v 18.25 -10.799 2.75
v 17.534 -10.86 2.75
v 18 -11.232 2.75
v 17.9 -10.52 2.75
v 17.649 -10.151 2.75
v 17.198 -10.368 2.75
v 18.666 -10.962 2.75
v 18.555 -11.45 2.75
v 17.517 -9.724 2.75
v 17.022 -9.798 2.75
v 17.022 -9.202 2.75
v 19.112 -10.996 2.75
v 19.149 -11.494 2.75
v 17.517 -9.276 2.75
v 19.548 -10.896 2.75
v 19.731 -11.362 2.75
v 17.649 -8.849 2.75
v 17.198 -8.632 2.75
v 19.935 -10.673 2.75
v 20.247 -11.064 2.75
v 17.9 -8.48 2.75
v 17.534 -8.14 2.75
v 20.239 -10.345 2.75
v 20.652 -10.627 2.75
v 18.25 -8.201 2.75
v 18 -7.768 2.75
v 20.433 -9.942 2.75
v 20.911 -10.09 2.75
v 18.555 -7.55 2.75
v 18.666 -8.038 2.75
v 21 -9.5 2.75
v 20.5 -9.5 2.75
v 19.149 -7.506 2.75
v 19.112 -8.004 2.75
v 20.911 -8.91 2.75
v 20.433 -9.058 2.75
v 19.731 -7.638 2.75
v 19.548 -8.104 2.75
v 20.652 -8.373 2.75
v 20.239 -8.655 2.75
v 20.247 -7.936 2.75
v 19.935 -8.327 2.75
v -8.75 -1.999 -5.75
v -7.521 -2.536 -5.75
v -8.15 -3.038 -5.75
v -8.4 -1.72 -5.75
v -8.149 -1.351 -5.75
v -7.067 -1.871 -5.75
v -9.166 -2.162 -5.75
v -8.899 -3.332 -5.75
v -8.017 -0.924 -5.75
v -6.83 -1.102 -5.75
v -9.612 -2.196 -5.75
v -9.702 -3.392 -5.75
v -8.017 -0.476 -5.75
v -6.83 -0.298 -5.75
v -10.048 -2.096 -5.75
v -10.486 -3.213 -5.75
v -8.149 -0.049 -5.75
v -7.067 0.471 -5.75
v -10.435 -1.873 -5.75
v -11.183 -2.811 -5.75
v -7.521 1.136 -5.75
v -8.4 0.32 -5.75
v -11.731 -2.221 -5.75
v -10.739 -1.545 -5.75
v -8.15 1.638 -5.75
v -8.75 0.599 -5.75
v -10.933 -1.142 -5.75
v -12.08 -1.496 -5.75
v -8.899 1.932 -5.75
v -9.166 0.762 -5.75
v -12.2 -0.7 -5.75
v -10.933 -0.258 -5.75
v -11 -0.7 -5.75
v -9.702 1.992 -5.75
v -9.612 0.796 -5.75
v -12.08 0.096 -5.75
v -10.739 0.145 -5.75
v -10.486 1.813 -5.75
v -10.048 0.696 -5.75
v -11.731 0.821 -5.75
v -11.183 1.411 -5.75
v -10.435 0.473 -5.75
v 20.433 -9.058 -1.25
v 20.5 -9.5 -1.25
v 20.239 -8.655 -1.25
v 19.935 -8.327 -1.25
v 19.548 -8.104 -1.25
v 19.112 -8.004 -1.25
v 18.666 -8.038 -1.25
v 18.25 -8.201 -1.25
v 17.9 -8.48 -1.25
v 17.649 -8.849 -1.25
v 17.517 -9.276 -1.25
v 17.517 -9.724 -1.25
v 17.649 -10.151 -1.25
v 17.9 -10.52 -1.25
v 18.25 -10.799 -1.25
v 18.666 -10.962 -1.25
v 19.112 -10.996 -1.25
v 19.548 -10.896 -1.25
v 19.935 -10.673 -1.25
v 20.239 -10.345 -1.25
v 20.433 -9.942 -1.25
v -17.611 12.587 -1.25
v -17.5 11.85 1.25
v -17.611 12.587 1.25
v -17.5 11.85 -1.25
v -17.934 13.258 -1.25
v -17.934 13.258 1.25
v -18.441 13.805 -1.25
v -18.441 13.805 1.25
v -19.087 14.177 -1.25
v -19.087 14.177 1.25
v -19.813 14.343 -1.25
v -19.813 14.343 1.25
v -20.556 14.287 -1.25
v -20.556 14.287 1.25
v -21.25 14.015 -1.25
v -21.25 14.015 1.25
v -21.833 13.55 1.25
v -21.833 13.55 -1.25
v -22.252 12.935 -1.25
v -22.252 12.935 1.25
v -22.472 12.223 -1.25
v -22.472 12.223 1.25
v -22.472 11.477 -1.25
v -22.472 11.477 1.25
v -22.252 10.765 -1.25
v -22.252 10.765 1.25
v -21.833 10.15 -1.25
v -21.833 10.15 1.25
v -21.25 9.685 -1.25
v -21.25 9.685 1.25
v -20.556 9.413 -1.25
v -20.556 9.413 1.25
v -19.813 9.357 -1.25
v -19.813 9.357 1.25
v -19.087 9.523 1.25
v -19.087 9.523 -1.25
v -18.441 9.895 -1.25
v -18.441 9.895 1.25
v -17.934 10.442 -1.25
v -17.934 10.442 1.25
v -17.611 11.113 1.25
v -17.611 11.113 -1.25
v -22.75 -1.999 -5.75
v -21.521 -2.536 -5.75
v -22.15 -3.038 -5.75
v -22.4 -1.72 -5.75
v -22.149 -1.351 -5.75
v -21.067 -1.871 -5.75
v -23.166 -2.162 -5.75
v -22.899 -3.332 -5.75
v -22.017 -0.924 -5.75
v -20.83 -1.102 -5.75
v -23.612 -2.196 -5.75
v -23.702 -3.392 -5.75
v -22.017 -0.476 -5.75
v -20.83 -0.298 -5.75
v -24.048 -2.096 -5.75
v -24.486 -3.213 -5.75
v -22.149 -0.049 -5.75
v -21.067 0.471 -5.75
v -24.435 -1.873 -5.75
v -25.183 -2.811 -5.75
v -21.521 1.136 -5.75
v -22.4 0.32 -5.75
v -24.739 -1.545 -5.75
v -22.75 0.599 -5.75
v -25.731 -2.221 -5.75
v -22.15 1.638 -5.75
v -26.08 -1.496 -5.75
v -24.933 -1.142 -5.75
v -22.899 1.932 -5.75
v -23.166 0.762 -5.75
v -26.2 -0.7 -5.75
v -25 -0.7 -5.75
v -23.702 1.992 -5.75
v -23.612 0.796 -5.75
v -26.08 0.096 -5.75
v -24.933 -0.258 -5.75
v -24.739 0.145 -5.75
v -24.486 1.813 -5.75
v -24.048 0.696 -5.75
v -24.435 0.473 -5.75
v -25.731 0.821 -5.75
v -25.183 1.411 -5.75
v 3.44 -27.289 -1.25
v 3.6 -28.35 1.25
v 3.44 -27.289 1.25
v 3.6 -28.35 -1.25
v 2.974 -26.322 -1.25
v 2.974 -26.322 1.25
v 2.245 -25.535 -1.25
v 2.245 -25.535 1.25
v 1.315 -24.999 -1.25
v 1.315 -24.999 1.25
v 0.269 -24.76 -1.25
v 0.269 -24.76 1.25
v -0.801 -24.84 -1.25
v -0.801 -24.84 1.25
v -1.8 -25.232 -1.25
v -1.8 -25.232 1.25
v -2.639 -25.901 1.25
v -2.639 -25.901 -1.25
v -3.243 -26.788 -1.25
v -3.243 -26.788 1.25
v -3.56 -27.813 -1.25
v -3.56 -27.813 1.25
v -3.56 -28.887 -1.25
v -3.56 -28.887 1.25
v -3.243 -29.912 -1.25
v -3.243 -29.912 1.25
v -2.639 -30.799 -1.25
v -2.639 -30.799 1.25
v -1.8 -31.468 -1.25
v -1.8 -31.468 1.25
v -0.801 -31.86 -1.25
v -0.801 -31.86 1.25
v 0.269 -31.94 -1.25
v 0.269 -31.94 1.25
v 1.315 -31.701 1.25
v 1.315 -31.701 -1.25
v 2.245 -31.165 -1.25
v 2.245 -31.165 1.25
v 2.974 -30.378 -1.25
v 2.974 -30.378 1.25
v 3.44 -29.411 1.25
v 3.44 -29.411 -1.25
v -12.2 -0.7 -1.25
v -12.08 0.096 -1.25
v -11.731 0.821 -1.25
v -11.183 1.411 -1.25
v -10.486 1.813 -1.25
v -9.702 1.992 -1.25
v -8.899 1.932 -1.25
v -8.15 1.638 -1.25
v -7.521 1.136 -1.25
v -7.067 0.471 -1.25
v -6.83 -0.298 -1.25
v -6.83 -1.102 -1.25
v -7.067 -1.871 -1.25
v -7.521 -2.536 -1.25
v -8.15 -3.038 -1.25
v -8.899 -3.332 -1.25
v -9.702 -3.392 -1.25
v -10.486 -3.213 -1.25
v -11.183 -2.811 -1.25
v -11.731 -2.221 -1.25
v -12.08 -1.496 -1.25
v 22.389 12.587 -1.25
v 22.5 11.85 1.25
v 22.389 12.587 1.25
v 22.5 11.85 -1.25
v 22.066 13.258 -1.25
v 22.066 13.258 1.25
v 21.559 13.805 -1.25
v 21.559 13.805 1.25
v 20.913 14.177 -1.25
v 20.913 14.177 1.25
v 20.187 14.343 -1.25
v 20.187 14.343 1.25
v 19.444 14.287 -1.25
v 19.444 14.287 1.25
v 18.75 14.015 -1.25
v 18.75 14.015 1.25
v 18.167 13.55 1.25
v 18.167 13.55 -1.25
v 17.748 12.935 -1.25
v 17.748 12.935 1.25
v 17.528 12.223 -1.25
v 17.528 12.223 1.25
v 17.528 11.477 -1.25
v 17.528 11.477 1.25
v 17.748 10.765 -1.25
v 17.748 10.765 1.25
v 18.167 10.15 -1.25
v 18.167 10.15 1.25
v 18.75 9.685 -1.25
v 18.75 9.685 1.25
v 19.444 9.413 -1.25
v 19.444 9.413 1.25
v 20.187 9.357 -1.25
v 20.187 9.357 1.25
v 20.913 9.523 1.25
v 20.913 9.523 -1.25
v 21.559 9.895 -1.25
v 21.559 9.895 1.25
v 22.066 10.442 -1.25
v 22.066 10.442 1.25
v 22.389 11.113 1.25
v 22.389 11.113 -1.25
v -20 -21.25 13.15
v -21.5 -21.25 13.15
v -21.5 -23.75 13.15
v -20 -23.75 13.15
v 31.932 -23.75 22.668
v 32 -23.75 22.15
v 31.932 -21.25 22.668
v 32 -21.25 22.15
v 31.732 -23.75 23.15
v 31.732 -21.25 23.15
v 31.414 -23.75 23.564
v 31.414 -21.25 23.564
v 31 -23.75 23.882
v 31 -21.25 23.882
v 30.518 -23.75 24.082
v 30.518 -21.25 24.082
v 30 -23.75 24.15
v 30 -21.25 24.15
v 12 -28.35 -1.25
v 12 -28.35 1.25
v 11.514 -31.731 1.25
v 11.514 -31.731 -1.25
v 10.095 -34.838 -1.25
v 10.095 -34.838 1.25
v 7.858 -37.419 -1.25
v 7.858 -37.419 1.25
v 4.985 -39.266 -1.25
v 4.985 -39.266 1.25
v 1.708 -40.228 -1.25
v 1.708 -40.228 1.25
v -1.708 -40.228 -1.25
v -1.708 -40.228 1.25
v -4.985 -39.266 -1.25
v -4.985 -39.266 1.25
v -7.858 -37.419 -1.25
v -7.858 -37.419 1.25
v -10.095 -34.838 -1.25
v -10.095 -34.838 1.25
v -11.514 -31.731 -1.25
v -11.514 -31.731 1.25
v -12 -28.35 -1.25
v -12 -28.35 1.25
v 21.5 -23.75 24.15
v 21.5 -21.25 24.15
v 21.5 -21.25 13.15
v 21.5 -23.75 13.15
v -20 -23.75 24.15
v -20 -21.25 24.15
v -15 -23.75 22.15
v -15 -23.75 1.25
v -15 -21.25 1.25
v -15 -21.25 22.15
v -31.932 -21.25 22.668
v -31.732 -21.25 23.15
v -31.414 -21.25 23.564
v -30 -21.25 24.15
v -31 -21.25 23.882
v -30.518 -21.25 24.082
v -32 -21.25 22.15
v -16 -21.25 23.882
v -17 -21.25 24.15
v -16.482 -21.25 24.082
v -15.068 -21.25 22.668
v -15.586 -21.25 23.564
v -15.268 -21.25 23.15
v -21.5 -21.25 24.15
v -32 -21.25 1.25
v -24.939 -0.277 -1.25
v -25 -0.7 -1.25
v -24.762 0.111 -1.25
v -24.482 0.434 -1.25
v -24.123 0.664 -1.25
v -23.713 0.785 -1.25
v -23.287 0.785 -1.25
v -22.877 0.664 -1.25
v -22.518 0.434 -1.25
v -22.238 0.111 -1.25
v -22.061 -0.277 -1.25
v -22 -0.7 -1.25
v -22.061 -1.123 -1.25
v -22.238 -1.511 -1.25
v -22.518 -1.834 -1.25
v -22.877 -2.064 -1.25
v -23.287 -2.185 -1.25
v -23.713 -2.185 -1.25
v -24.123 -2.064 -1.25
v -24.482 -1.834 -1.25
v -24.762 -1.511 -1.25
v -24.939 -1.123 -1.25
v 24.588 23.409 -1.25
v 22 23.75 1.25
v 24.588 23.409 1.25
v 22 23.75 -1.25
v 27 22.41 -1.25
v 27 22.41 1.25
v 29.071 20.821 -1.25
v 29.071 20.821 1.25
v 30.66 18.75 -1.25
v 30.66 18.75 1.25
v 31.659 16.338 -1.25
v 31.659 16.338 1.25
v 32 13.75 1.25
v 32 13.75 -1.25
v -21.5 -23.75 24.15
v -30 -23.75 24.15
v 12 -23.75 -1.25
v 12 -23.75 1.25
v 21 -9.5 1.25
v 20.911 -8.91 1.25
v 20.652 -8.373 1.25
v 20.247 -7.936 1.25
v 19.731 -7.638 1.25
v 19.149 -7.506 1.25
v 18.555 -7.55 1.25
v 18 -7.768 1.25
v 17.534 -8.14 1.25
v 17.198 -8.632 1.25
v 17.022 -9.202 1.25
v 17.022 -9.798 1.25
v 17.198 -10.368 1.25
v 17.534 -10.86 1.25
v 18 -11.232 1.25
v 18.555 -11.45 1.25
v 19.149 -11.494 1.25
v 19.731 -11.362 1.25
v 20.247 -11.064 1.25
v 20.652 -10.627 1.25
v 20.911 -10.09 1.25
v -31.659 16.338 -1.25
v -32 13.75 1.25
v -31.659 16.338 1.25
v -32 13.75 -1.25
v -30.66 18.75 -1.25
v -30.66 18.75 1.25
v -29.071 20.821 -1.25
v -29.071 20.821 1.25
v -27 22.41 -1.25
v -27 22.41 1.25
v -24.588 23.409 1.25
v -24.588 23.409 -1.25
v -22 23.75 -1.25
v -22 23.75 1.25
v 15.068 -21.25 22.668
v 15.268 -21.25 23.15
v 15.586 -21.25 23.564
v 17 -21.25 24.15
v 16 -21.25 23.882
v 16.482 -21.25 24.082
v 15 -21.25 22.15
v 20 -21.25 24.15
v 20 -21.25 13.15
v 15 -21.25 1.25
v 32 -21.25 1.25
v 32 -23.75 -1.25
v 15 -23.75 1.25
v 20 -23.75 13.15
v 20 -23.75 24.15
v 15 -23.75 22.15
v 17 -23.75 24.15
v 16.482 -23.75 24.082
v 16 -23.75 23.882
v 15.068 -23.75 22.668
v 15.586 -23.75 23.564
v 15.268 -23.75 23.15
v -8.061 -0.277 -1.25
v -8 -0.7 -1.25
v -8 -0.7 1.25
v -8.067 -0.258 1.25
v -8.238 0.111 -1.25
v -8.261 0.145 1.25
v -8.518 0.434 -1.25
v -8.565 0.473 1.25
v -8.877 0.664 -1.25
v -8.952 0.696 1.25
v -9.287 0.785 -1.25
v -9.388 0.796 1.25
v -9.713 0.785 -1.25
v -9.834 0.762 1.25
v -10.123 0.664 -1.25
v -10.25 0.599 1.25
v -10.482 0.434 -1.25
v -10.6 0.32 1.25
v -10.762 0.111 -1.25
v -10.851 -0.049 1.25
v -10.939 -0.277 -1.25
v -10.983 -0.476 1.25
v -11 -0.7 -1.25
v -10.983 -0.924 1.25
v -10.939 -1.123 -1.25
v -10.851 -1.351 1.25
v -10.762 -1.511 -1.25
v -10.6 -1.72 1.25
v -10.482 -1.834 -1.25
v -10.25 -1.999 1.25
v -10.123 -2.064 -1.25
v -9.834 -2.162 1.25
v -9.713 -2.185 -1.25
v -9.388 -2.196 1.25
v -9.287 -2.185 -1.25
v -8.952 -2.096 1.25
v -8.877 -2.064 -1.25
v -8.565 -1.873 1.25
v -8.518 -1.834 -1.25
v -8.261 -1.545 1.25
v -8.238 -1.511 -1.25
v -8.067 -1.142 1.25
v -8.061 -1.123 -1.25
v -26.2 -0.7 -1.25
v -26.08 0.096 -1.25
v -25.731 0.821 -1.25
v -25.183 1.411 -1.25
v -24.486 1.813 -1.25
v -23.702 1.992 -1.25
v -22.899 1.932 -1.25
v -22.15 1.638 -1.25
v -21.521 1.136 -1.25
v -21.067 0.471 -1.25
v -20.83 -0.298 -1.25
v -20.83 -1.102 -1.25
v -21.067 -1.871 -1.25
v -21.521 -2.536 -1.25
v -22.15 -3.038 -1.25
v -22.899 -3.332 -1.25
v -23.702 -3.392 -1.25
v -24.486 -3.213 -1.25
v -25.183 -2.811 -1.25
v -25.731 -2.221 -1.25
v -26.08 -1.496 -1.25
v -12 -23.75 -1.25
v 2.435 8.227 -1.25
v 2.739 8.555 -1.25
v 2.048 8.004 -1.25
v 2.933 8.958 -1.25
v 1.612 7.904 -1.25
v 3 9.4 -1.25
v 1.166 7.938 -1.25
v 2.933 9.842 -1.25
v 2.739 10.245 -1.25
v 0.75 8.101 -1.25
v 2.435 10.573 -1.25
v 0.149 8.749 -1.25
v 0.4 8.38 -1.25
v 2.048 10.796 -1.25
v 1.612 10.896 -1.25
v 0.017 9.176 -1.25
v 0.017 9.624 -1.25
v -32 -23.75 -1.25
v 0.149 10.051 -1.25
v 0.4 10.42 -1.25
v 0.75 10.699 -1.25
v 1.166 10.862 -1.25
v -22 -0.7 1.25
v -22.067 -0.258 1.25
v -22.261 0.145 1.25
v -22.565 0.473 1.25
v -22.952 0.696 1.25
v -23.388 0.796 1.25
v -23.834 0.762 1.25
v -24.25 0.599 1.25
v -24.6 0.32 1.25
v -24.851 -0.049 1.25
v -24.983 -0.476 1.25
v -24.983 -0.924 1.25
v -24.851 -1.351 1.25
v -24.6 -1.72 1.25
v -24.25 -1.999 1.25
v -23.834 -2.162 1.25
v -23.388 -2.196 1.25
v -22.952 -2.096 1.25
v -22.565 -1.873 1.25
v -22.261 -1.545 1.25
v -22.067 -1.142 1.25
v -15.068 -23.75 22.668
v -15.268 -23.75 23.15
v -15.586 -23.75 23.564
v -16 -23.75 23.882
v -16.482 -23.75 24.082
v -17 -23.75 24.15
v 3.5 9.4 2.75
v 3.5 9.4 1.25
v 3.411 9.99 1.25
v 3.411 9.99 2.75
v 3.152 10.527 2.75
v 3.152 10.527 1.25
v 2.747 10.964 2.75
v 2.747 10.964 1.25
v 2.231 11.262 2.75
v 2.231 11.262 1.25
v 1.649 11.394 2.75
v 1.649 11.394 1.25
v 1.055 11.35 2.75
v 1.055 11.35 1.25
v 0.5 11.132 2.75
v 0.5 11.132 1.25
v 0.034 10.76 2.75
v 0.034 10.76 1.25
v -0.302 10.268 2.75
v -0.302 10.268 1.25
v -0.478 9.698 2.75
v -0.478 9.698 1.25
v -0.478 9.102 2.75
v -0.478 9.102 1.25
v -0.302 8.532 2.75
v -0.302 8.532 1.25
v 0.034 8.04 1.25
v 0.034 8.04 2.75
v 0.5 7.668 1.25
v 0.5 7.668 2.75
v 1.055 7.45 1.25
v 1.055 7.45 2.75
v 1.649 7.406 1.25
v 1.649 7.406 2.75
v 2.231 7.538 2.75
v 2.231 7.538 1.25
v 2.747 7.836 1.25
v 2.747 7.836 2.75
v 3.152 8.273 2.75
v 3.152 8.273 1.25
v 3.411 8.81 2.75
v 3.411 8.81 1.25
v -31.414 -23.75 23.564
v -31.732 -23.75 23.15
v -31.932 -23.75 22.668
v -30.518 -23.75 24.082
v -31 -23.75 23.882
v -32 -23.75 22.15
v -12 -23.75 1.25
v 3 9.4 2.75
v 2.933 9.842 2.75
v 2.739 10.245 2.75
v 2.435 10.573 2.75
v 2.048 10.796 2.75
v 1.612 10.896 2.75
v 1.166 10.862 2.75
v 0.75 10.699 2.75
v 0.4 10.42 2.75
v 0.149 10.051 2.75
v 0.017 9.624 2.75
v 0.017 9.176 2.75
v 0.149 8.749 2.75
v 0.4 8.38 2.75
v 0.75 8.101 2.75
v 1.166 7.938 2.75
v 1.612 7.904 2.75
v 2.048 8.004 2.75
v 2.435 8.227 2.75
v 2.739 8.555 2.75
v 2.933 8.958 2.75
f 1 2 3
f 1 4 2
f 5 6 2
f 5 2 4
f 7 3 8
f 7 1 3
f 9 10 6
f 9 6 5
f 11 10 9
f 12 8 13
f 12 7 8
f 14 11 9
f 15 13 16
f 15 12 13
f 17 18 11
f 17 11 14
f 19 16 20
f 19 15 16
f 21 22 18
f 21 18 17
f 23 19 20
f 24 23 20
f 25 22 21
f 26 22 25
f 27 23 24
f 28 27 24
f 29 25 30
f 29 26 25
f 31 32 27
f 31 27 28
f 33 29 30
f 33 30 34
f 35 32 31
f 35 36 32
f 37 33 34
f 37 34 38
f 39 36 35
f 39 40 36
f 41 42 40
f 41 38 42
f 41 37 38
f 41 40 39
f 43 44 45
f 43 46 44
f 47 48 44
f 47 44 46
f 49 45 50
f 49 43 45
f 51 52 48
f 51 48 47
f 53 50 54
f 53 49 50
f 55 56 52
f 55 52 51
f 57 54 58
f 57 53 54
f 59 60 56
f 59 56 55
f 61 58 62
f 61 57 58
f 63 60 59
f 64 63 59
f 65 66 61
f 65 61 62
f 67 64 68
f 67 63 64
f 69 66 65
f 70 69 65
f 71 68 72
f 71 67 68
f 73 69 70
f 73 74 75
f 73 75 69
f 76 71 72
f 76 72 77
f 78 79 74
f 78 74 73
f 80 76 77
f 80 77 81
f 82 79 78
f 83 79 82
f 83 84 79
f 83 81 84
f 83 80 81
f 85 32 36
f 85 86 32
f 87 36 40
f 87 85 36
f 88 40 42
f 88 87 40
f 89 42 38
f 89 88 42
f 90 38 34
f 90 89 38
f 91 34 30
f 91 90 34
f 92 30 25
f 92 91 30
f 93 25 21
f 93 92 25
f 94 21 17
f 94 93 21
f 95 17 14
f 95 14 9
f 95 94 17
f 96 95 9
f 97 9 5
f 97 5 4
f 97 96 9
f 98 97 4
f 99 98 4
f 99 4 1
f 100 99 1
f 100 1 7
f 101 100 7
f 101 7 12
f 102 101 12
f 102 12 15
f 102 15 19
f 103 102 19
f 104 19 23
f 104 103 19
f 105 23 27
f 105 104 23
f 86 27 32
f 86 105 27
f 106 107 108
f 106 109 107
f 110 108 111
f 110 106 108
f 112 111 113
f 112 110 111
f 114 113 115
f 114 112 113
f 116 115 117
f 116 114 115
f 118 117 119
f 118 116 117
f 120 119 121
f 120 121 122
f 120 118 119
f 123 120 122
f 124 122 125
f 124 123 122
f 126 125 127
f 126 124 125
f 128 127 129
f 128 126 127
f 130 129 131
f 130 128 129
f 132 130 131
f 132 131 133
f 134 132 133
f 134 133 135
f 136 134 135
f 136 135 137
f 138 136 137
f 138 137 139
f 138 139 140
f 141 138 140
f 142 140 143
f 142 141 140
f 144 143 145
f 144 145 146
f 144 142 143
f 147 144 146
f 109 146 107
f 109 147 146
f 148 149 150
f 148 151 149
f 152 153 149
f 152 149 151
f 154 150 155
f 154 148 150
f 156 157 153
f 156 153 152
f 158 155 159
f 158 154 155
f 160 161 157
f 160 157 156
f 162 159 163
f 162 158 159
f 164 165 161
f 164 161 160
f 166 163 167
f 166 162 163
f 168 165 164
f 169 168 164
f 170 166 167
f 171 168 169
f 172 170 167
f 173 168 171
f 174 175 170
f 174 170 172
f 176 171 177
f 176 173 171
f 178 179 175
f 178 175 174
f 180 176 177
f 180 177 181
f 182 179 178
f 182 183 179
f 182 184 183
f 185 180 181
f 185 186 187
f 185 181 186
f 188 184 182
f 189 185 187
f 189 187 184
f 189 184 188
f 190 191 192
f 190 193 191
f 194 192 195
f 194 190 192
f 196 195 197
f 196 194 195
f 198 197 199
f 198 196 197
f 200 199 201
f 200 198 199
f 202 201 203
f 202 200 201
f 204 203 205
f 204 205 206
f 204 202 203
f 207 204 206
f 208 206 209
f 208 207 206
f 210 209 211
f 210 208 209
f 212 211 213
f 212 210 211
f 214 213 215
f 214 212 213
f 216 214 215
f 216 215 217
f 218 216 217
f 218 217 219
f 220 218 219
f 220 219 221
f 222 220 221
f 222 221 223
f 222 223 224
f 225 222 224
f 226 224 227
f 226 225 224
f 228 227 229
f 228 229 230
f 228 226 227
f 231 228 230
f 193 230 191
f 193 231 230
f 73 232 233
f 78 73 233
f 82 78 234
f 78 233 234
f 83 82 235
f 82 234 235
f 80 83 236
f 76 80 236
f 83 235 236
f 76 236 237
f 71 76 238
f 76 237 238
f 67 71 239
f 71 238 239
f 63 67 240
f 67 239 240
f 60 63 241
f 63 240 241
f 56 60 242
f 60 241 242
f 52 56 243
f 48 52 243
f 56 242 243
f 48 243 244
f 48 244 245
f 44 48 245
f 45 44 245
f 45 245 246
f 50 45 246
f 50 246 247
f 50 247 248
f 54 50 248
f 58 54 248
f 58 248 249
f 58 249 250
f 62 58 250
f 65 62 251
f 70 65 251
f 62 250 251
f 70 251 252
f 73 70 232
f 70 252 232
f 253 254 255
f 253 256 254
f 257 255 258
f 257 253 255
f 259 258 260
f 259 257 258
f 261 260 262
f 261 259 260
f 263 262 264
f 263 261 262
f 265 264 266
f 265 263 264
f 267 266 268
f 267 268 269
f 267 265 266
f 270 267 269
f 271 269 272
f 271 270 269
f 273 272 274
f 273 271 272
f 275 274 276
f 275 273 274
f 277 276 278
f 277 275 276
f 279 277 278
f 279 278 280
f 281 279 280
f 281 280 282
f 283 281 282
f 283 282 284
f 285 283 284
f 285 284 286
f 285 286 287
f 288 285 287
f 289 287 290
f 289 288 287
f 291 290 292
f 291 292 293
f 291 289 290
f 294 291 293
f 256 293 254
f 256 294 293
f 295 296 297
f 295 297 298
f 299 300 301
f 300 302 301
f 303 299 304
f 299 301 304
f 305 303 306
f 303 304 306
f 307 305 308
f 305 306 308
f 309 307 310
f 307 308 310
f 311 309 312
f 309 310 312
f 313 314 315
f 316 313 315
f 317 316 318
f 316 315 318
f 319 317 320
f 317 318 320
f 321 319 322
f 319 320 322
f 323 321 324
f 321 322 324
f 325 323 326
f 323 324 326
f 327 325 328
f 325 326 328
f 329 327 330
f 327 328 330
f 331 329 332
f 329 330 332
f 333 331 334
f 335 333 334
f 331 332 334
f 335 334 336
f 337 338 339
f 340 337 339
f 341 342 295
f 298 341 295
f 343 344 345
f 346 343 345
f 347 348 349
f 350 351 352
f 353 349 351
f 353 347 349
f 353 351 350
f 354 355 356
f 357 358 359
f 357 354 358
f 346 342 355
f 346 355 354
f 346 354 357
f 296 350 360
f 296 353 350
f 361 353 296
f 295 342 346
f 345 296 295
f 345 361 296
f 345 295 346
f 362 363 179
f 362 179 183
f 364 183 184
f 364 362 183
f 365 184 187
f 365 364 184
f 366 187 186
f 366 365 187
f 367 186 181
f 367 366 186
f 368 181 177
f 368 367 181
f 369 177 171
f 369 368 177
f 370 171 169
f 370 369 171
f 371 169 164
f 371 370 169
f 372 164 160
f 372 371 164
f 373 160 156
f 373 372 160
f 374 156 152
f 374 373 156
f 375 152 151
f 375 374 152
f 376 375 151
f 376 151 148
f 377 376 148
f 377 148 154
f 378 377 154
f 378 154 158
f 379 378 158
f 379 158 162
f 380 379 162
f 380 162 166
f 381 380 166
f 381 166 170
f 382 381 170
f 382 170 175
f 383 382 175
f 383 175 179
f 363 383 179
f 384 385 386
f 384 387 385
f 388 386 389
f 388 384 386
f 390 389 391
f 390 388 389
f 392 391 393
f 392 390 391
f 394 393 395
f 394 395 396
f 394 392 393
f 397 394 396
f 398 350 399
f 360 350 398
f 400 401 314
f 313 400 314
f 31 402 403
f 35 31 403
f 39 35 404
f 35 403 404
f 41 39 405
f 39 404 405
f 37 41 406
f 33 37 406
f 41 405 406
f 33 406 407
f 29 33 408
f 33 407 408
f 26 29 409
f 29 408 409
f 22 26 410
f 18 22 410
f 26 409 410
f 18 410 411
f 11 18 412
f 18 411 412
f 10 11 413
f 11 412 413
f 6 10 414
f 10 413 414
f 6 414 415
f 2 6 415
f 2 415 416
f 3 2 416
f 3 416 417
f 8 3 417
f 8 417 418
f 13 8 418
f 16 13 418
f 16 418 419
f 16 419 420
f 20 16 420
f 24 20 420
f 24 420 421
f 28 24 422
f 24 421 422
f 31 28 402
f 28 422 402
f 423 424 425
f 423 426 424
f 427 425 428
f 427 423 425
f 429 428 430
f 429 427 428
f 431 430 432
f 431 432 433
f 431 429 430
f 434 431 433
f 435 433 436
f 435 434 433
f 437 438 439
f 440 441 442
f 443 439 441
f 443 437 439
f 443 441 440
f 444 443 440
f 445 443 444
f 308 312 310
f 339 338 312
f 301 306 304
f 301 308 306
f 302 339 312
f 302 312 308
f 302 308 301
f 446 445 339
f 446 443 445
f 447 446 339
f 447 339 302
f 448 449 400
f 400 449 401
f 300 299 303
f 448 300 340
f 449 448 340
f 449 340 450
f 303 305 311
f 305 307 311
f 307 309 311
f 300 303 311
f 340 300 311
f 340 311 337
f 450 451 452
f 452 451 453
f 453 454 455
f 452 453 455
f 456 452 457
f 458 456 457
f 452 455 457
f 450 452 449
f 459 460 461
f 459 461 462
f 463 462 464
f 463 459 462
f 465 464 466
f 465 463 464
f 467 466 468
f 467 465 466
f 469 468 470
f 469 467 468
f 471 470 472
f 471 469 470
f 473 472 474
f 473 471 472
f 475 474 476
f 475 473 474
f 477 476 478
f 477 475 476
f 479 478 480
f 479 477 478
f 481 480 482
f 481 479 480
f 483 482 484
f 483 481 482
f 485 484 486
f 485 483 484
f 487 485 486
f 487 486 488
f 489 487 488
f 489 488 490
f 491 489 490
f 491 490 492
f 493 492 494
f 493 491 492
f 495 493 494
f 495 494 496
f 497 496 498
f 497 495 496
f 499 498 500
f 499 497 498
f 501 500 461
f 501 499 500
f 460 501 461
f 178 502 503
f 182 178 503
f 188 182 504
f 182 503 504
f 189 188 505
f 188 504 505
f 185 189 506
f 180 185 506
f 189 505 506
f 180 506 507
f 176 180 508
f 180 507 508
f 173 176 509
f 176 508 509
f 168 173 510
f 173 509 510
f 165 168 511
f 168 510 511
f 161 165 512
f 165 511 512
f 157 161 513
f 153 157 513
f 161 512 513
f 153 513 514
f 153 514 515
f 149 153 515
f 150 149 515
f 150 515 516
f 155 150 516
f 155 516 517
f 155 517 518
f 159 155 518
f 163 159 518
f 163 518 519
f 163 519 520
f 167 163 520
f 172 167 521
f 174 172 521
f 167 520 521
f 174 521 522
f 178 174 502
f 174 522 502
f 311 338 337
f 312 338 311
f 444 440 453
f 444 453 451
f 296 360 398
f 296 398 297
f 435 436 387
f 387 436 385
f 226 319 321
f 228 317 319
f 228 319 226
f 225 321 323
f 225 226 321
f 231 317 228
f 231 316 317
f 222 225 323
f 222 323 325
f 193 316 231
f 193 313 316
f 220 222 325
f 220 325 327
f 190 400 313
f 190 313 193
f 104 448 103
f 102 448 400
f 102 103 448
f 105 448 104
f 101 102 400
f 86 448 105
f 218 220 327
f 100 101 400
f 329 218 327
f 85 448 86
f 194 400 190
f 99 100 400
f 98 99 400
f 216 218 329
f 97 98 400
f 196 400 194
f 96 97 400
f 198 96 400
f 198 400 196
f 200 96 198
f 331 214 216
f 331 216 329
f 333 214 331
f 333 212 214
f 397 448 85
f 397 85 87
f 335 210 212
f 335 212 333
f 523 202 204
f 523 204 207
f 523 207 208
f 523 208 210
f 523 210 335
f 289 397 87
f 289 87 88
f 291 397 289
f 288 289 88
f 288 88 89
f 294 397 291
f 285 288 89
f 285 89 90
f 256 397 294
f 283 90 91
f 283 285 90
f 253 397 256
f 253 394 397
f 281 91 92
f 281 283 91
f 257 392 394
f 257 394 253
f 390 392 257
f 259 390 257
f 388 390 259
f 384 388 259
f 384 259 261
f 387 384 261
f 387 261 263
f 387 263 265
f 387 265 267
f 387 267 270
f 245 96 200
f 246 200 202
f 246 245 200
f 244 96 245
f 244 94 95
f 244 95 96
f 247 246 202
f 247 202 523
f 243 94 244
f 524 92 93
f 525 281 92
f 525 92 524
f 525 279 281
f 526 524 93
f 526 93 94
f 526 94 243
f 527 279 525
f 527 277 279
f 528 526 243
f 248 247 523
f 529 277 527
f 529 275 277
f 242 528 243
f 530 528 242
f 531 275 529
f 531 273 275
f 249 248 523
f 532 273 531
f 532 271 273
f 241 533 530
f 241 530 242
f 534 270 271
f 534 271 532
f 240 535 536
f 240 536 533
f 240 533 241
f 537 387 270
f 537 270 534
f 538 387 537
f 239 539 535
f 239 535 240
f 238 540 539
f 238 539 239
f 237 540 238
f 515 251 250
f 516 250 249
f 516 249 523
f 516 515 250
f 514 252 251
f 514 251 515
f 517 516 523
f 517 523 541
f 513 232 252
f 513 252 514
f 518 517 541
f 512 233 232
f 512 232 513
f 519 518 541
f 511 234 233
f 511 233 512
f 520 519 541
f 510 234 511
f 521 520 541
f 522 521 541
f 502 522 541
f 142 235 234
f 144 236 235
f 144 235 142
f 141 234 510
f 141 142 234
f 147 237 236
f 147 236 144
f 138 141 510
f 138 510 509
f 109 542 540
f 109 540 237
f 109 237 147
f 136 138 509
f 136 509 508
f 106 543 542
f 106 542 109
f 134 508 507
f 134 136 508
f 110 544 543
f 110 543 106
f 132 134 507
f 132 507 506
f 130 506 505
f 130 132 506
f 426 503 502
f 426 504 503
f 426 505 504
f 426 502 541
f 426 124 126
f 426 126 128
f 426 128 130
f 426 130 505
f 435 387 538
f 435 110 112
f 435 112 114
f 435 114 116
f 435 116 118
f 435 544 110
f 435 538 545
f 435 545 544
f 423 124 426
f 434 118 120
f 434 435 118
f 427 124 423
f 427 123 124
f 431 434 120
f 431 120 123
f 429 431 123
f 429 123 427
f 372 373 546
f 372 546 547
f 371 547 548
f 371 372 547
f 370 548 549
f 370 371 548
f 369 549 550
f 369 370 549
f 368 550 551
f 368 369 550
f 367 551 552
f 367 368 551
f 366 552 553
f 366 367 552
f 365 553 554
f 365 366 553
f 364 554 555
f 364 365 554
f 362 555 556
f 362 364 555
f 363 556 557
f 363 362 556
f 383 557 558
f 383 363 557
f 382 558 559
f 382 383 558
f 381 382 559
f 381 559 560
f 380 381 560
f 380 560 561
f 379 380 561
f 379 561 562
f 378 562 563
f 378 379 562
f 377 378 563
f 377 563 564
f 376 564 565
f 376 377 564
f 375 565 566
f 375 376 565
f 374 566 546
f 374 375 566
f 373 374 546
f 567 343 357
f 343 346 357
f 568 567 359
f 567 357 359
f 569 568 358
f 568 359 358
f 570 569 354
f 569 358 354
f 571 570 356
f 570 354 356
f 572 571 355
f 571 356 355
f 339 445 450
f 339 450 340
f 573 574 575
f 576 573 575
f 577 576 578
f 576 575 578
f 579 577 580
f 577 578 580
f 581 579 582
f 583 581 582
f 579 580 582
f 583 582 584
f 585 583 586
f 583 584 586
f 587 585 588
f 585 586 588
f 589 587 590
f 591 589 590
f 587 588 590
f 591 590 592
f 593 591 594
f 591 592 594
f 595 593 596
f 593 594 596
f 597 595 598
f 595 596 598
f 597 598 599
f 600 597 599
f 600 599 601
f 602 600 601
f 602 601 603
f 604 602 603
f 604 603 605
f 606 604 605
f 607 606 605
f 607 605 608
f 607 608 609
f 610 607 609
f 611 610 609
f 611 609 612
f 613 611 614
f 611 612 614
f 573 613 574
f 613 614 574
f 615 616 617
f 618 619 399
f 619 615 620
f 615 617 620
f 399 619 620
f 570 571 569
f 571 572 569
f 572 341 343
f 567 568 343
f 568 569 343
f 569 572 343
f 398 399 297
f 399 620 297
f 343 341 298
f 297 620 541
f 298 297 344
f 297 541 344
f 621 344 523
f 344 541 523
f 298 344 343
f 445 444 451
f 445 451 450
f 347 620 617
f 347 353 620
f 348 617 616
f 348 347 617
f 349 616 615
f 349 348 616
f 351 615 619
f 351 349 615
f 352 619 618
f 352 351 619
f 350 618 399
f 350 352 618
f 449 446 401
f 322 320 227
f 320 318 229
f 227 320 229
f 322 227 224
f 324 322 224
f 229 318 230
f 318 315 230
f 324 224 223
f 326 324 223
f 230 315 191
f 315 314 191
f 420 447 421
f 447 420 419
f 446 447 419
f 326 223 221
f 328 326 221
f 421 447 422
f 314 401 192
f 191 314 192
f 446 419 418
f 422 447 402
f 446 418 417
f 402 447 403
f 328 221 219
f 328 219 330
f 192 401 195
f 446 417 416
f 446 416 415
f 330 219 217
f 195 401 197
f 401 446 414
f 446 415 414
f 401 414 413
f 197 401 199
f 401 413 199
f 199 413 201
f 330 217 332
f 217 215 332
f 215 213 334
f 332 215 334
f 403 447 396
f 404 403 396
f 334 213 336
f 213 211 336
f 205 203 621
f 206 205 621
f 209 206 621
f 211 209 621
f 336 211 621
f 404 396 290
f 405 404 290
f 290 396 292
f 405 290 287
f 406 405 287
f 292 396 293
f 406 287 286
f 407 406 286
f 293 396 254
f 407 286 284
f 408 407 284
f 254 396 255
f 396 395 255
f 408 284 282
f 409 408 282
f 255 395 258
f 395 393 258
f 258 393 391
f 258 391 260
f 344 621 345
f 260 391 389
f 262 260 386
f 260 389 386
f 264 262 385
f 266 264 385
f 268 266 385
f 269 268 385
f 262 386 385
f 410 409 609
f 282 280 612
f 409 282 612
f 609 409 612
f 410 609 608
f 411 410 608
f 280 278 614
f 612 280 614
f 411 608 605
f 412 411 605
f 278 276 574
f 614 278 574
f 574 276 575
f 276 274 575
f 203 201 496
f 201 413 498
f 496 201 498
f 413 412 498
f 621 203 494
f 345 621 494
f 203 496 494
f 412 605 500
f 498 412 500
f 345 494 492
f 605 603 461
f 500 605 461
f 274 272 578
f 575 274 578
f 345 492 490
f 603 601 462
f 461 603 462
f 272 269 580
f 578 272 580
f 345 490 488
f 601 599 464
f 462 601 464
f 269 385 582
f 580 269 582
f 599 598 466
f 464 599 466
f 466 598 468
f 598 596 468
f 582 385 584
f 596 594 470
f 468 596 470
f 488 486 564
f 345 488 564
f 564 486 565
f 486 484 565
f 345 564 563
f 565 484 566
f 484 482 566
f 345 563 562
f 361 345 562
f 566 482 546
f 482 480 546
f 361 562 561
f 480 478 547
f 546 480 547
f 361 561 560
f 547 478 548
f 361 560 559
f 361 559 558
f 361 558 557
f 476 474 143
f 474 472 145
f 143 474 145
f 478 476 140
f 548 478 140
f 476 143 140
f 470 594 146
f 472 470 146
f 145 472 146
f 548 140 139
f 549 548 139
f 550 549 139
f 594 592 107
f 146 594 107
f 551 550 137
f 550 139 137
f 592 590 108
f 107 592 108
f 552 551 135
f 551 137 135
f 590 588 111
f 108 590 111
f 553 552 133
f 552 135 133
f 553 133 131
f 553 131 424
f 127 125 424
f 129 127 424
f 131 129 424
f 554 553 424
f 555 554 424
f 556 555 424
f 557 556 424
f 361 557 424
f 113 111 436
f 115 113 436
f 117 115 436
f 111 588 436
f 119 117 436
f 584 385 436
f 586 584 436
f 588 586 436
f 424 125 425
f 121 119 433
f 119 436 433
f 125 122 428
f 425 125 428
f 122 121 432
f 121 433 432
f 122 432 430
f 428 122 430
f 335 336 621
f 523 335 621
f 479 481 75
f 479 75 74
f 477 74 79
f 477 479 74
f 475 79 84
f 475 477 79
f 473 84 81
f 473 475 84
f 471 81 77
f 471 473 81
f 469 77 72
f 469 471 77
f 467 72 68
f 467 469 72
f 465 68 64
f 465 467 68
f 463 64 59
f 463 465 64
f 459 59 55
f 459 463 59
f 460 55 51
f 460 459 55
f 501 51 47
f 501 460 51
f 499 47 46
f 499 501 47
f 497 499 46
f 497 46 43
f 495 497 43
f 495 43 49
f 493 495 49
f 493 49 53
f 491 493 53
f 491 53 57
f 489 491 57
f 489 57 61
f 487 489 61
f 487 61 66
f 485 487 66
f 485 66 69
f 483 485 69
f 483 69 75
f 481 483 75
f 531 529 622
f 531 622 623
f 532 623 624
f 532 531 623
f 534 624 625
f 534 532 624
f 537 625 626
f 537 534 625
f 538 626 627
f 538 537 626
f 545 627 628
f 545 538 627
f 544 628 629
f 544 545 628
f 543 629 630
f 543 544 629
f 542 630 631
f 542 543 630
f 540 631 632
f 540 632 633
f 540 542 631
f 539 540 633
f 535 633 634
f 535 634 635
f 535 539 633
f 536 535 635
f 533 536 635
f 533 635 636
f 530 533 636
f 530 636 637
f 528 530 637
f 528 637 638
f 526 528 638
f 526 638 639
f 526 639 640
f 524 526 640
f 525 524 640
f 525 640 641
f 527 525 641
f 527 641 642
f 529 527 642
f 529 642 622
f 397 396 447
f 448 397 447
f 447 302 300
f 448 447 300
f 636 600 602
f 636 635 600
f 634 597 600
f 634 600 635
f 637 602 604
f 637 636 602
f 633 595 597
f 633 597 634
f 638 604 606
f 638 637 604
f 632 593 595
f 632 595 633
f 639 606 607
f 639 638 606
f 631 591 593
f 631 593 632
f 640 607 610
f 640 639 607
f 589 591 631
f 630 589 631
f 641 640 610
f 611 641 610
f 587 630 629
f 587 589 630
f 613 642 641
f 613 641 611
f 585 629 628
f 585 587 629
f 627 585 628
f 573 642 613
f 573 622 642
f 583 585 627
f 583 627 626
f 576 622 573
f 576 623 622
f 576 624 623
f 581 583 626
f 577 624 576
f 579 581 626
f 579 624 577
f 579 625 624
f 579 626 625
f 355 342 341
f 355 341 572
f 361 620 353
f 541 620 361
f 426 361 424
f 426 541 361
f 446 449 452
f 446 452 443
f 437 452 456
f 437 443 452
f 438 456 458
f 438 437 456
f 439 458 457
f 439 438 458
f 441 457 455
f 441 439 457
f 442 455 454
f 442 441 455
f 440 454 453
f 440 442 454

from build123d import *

# Parameters (mm, degrees)
SKETCH1_R           = 3.6
SKETCH1_R_2         = 2.5
SKETCH1_R_3         = 1.5
BOSS_EXTRUDE1_DEPTH = 1.25
SKETCH2_R           = 2
SKETCH2_R_2         = 1.5
BOSS_EXTRUDE2_DEPTH = 1.5
SKETCH3_R           = 2.7
SKETCH3_R_2         = 1.5
BOSS_EXTRUDE3_DEPTH = 4.5
FILLET1_R           = 10
SKETCH4_W           = 17
SKETCH4_H           = 2.5
BOSS_EXTRUDE4_DEPTH = 22.9
SKETCH5_W           = 1.5
SKETCH5_H           = 11
CUT_EXTRUDE1_DEPTH  = 20.1
FILLET2_R           = 2


with BuildPart() as part:
    # Sketch1 → Boss-Extrude1 (new body, symmetric)
    with BuildSketch(Plane.XY):
        with BuildLine():
            Line((-12, -28.35), (-12, -23.75))
            Line((-12, -23.75), (-32, -23.75))
            Line((-32, -23.75), (-32, 23.75))
            Line((-32, 23.75), (32, 23.75))
            Line((32, 23.75), (32, -23.75))
            Line((32, -23.75), (12, -23.75))
            Line((12, -23.75), (12, -28.35))
            ThreePointArc((12, -28.35), (0, -40.35), (-12, -28.35))
        make_face()
        with Locations((0, -28.35)):
            Circle(SKETCH1_R, mode=Mode.SUBTRACT)
        with Locations((-20, 11.85)):
            Circle(SKETCH1_R_2, mode=Mode.SUBTRACT)
        with Locations((19, -9.5)):
            Circle(SKETCH1_R_3, mode=Mode.SUBTRACT)
        with Locations((1.5, 9.4)):
            Circle(SKETCH1_R_3, mode=Mode.SUBTRACT)
        with Locations((20, 11.85)):
            Circle(SKETCH1_R_2, mode=Mode.SUBTRACT)
        with Locations((-23.5, -0.7)):
            Circle(SKETCH1_R_3, mode=Mode.SUBTRACT)
        with Locations((-9.5, -0.7)):
            Circle(SKETCH1_R_3, mode=Mode.SUBTRACT)
    extrude(amount=BOSS_EXTRUDE1_DEPTH, both=True)

    # Sketch2 → Boss-Extrude2 (add)
    with BuildSketch(Plane.XY.offset(1.25)):
        with Locations((19, -9.5)):
            Circle(SKETCH2_R)
        with Locations((19, -9.5)):
            Circle(SKETCH2_R_2, mode=Mode.SUBTRACT)
        with Locations((1.5, 9.4)):
            Circle(SKETCH2_R)
        with Locations((1.5, 9.4)):
            Circle(SKETCH2_R_2, mode=Mode.SUBTRACT)
    extrude(amount=BOSS_EXTRUDE2_DEPTH)

    # Sketch3 → Boss-Extrude3 (add)
    with BuildSketch(Plane(origin=(0, 0, -1.25), x_dir=(-1, 0, 0), z_dir=(0, 0, -1))):
        with Locations((9.5, -0.7)):
            Circle(SKETCH3_R)
        with Locations((9.5, -0.7)):
            Circle(SKETCH3_R_2, mode=Mode.SUBTRACT)
        with Locations((23.5, -0.7)):
            Circle(SKETCH3_R)
        with Locations((23.5, -0.7)):
            Circle(SKETCH3_R_2, mode=Mode.SUBTRACT)
    extrude(amount=BOSS_EXTRUDE3_DEPTH)

    # Fillet1
    fillet1_edges = [part.edges().sort_by_distance(p)[0] for p in [
        (-32, 23.75, 0),
        (32, 23.75, 0),
    ]]
    fillet(fillet1_edges, radius=FILLET1_R)

    # Sketch4 → Boss-Extrude4 (add)
    with BuildSketch(Plane.XY.offset(1.25)):
        with Locations((-23.5, -22.5)):
            Rectangle(SKETCH4_W, SKETCH4_H)
        with Locations((23.5, -22.5)):
            Rectangle(SKETCH4_W, SKETCH4_H)
    extrude(amount=BOSS_EXTRUDE4_DEPTH)

    # Sketch5 → Cut-Extrude1 (cut, through all)
    with BuildSketch(Plane(origin=(0, -21.25, 0), x_dir=(1, 0, 0), z_dir=(0, 1, 0))):
        with Locations((-20.75, -18.65)):
            Rectangle(SKETCH5_W, SKETCH5_H)
        with Locations((20.75, -18.65)):
            Rectangle(SKETCH5_W, SKETCH5_H)
    extrude(amount=-CUT_EXTRUDE1_DEPTH, mode=Mode.SUBTRACT)

    # Fillet2
    fillet2_edges = [part.edges().sort_by_distance(p)[0] for p in [
        (32, -22.5, 24.15),
        (15, -22.5, 24.15),
        (-32, -22.5, 24.15),
        (-15, -22.5, 24.15),
    ]]
    fillet(fillet2_edges, radius=FILLET2_R)


solid = part.part
